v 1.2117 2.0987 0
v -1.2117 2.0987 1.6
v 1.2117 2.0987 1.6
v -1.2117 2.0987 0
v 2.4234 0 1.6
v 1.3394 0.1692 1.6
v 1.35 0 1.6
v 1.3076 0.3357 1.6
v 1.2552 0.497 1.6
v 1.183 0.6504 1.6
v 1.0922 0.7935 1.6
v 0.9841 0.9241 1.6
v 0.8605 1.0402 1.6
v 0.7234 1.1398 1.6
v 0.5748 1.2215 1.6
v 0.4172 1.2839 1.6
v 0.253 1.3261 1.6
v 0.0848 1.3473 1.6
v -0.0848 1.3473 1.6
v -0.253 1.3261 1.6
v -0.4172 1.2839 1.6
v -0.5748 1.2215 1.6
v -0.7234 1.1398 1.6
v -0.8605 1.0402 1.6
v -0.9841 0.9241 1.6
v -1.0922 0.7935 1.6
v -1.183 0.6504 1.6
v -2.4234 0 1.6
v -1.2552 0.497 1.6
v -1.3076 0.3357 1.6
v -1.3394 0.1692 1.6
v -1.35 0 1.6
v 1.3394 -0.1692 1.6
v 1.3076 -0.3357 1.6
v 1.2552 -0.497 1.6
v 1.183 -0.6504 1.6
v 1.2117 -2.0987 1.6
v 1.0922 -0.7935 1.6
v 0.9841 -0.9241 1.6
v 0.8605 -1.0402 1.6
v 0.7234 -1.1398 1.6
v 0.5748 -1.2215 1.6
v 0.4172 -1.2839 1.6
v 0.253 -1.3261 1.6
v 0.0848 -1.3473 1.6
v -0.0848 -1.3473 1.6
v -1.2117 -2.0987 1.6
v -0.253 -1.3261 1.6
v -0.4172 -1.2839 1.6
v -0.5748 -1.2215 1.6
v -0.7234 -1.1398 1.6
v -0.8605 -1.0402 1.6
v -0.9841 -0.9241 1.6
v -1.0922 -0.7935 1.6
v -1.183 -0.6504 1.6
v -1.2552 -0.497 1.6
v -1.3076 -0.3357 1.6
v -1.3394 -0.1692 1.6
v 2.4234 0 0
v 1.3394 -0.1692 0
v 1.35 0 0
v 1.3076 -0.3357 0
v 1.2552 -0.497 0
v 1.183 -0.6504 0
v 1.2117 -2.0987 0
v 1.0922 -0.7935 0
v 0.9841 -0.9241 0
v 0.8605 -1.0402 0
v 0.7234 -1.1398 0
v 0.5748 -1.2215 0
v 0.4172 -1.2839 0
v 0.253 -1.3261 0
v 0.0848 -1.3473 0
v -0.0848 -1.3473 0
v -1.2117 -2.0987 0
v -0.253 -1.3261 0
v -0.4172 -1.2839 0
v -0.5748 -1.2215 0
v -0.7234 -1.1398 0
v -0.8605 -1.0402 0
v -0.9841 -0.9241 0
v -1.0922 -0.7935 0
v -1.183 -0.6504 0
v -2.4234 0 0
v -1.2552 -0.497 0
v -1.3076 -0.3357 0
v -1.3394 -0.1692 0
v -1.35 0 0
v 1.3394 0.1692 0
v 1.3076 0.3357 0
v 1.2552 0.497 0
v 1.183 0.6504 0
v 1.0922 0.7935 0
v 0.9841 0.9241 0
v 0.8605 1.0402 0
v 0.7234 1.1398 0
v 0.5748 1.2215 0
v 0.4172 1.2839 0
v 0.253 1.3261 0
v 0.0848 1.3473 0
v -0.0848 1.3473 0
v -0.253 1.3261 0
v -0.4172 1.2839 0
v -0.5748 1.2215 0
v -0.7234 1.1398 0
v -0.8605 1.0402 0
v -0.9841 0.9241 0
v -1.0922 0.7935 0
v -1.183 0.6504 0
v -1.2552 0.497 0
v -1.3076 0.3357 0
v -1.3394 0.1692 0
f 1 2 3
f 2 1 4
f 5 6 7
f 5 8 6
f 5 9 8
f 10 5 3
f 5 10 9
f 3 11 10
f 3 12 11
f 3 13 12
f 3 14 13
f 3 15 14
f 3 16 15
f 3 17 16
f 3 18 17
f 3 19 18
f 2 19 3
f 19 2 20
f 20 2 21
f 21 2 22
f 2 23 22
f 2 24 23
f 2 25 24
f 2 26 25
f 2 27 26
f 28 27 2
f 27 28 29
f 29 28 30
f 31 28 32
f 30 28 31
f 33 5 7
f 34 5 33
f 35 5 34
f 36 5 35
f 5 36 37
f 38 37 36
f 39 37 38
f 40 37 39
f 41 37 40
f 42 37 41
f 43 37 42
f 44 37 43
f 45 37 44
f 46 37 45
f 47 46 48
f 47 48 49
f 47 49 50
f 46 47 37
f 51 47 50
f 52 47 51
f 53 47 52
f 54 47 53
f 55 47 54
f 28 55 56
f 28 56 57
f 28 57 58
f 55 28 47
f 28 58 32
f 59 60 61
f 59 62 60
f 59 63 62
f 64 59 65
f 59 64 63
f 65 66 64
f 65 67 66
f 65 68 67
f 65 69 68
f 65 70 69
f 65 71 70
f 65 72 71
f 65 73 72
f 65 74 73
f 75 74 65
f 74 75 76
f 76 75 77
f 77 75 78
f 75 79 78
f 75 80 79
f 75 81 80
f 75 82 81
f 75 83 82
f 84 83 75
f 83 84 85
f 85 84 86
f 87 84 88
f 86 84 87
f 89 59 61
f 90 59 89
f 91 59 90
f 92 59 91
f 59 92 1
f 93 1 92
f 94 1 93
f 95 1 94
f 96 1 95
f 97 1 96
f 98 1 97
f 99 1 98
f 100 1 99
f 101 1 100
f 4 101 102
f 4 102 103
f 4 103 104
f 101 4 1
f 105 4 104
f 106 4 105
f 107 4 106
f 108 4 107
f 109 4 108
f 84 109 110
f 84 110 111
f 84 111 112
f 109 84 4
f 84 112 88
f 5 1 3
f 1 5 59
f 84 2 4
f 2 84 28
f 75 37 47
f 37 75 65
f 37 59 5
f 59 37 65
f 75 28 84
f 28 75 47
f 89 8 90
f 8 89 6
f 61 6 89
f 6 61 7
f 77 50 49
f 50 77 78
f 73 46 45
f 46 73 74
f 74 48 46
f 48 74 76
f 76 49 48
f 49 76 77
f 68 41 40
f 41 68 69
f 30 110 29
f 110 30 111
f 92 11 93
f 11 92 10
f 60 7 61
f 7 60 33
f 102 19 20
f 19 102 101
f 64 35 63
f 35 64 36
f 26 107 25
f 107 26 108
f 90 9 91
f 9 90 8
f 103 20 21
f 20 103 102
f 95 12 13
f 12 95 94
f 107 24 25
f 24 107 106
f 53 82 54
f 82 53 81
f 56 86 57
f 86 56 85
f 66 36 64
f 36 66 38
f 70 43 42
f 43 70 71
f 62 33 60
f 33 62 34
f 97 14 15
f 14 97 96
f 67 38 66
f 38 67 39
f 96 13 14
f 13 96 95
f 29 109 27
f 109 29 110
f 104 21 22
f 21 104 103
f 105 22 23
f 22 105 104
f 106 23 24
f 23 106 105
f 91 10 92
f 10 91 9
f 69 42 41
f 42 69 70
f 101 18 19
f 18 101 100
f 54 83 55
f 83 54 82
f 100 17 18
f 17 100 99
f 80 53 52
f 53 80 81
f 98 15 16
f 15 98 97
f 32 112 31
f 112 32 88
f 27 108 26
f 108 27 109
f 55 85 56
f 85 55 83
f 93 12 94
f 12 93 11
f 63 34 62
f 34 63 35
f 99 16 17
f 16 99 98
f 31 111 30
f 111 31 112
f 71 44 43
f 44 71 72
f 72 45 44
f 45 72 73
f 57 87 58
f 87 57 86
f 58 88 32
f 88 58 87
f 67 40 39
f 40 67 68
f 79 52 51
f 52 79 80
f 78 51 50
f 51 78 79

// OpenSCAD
$fn = 50;


difference() {
	union() {
		translate(v = [0, 0, 0]) {
			rotate(a = [0, 0, 0]) {
				difference() {
					union() {
						linear_extrude(height = 1.6000000000) {
							polygon(points = [[2.4234000000, 0.0000000000], [1.2117000000, 2.0987259635], [-1.2117000000, 2.0987259635], [-2.4234000000, 0.0000000000], [-1.2117000000, -2.0987259635], [1.2117000000, -2.0987259635]]);
						}
					}
					union();
				}
			}
		}
	}
	union() {
		cylinder(h = 100, r = 1.3500000000);
	}
}
